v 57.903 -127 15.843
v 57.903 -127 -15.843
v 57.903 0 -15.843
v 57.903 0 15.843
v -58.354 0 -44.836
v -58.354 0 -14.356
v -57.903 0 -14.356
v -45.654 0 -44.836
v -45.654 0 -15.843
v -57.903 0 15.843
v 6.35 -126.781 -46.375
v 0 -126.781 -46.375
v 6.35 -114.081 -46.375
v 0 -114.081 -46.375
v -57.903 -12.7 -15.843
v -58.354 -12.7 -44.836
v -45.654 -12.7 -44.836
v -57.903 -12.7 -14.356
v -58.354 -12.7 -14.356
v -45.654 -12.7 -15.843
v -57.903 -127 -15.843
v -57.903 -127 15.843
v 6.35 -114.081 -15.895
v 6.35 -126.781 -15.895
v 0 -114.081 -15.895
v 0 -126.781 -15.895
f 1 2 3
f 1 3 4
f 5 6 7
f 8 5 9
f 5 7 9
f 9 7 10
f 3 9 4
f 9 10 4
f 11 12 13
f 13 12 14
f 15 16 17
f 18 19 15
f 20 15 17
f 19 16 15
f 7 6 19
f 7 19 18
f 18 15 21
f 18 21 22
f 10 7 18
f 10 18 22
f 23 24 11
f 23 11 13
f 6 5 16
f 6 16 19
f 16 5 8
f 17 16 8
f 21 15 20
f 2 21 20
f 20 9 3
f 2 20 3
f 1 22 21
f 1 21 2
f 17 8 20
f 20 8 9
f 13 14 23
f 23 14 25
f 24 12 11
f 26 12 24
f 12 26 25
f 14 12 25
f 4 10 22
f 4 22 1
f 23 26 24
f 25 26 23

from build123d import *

# Parameters (mm, degrees)
F0_W     = 115.806826
F0_H     = 31.68565
F1_DEPTH = 127
F2_W     = 12.7
F2_H     = 30.48
F3_DEPTH = 6.35
F4_W     = 12.7
F4_H     = 30.48
F5_DEPTH = 12.7


with BuildPart() as f1:
    # F0 (on Front) → F1 (new body)
    with BuildSketch(Plane.XZ):
        Rectangle(F0_W, F0_H)
    extrude(amount=F1_DEPTH)

    # F4 (on Front) → F5 (join)
    with BuildSketch(Plane.XZ):
        with Locations((-52.00438, -29.596459)):
            Rectangle(F4_W, F4_H)
    extrude(amount=F5_DEPTH)


with BuildPart() as f3:
    # F2 (on Right) → F3 (new body)
    with BuildSketch(Plane.YZ):
        with Locations((-120.430645, -31.135114)):
            Rectangle(F2_W, F2_H)
    extrude(amount=F3_DEPTH)


solid = Compound([f1.part, f3.part])
